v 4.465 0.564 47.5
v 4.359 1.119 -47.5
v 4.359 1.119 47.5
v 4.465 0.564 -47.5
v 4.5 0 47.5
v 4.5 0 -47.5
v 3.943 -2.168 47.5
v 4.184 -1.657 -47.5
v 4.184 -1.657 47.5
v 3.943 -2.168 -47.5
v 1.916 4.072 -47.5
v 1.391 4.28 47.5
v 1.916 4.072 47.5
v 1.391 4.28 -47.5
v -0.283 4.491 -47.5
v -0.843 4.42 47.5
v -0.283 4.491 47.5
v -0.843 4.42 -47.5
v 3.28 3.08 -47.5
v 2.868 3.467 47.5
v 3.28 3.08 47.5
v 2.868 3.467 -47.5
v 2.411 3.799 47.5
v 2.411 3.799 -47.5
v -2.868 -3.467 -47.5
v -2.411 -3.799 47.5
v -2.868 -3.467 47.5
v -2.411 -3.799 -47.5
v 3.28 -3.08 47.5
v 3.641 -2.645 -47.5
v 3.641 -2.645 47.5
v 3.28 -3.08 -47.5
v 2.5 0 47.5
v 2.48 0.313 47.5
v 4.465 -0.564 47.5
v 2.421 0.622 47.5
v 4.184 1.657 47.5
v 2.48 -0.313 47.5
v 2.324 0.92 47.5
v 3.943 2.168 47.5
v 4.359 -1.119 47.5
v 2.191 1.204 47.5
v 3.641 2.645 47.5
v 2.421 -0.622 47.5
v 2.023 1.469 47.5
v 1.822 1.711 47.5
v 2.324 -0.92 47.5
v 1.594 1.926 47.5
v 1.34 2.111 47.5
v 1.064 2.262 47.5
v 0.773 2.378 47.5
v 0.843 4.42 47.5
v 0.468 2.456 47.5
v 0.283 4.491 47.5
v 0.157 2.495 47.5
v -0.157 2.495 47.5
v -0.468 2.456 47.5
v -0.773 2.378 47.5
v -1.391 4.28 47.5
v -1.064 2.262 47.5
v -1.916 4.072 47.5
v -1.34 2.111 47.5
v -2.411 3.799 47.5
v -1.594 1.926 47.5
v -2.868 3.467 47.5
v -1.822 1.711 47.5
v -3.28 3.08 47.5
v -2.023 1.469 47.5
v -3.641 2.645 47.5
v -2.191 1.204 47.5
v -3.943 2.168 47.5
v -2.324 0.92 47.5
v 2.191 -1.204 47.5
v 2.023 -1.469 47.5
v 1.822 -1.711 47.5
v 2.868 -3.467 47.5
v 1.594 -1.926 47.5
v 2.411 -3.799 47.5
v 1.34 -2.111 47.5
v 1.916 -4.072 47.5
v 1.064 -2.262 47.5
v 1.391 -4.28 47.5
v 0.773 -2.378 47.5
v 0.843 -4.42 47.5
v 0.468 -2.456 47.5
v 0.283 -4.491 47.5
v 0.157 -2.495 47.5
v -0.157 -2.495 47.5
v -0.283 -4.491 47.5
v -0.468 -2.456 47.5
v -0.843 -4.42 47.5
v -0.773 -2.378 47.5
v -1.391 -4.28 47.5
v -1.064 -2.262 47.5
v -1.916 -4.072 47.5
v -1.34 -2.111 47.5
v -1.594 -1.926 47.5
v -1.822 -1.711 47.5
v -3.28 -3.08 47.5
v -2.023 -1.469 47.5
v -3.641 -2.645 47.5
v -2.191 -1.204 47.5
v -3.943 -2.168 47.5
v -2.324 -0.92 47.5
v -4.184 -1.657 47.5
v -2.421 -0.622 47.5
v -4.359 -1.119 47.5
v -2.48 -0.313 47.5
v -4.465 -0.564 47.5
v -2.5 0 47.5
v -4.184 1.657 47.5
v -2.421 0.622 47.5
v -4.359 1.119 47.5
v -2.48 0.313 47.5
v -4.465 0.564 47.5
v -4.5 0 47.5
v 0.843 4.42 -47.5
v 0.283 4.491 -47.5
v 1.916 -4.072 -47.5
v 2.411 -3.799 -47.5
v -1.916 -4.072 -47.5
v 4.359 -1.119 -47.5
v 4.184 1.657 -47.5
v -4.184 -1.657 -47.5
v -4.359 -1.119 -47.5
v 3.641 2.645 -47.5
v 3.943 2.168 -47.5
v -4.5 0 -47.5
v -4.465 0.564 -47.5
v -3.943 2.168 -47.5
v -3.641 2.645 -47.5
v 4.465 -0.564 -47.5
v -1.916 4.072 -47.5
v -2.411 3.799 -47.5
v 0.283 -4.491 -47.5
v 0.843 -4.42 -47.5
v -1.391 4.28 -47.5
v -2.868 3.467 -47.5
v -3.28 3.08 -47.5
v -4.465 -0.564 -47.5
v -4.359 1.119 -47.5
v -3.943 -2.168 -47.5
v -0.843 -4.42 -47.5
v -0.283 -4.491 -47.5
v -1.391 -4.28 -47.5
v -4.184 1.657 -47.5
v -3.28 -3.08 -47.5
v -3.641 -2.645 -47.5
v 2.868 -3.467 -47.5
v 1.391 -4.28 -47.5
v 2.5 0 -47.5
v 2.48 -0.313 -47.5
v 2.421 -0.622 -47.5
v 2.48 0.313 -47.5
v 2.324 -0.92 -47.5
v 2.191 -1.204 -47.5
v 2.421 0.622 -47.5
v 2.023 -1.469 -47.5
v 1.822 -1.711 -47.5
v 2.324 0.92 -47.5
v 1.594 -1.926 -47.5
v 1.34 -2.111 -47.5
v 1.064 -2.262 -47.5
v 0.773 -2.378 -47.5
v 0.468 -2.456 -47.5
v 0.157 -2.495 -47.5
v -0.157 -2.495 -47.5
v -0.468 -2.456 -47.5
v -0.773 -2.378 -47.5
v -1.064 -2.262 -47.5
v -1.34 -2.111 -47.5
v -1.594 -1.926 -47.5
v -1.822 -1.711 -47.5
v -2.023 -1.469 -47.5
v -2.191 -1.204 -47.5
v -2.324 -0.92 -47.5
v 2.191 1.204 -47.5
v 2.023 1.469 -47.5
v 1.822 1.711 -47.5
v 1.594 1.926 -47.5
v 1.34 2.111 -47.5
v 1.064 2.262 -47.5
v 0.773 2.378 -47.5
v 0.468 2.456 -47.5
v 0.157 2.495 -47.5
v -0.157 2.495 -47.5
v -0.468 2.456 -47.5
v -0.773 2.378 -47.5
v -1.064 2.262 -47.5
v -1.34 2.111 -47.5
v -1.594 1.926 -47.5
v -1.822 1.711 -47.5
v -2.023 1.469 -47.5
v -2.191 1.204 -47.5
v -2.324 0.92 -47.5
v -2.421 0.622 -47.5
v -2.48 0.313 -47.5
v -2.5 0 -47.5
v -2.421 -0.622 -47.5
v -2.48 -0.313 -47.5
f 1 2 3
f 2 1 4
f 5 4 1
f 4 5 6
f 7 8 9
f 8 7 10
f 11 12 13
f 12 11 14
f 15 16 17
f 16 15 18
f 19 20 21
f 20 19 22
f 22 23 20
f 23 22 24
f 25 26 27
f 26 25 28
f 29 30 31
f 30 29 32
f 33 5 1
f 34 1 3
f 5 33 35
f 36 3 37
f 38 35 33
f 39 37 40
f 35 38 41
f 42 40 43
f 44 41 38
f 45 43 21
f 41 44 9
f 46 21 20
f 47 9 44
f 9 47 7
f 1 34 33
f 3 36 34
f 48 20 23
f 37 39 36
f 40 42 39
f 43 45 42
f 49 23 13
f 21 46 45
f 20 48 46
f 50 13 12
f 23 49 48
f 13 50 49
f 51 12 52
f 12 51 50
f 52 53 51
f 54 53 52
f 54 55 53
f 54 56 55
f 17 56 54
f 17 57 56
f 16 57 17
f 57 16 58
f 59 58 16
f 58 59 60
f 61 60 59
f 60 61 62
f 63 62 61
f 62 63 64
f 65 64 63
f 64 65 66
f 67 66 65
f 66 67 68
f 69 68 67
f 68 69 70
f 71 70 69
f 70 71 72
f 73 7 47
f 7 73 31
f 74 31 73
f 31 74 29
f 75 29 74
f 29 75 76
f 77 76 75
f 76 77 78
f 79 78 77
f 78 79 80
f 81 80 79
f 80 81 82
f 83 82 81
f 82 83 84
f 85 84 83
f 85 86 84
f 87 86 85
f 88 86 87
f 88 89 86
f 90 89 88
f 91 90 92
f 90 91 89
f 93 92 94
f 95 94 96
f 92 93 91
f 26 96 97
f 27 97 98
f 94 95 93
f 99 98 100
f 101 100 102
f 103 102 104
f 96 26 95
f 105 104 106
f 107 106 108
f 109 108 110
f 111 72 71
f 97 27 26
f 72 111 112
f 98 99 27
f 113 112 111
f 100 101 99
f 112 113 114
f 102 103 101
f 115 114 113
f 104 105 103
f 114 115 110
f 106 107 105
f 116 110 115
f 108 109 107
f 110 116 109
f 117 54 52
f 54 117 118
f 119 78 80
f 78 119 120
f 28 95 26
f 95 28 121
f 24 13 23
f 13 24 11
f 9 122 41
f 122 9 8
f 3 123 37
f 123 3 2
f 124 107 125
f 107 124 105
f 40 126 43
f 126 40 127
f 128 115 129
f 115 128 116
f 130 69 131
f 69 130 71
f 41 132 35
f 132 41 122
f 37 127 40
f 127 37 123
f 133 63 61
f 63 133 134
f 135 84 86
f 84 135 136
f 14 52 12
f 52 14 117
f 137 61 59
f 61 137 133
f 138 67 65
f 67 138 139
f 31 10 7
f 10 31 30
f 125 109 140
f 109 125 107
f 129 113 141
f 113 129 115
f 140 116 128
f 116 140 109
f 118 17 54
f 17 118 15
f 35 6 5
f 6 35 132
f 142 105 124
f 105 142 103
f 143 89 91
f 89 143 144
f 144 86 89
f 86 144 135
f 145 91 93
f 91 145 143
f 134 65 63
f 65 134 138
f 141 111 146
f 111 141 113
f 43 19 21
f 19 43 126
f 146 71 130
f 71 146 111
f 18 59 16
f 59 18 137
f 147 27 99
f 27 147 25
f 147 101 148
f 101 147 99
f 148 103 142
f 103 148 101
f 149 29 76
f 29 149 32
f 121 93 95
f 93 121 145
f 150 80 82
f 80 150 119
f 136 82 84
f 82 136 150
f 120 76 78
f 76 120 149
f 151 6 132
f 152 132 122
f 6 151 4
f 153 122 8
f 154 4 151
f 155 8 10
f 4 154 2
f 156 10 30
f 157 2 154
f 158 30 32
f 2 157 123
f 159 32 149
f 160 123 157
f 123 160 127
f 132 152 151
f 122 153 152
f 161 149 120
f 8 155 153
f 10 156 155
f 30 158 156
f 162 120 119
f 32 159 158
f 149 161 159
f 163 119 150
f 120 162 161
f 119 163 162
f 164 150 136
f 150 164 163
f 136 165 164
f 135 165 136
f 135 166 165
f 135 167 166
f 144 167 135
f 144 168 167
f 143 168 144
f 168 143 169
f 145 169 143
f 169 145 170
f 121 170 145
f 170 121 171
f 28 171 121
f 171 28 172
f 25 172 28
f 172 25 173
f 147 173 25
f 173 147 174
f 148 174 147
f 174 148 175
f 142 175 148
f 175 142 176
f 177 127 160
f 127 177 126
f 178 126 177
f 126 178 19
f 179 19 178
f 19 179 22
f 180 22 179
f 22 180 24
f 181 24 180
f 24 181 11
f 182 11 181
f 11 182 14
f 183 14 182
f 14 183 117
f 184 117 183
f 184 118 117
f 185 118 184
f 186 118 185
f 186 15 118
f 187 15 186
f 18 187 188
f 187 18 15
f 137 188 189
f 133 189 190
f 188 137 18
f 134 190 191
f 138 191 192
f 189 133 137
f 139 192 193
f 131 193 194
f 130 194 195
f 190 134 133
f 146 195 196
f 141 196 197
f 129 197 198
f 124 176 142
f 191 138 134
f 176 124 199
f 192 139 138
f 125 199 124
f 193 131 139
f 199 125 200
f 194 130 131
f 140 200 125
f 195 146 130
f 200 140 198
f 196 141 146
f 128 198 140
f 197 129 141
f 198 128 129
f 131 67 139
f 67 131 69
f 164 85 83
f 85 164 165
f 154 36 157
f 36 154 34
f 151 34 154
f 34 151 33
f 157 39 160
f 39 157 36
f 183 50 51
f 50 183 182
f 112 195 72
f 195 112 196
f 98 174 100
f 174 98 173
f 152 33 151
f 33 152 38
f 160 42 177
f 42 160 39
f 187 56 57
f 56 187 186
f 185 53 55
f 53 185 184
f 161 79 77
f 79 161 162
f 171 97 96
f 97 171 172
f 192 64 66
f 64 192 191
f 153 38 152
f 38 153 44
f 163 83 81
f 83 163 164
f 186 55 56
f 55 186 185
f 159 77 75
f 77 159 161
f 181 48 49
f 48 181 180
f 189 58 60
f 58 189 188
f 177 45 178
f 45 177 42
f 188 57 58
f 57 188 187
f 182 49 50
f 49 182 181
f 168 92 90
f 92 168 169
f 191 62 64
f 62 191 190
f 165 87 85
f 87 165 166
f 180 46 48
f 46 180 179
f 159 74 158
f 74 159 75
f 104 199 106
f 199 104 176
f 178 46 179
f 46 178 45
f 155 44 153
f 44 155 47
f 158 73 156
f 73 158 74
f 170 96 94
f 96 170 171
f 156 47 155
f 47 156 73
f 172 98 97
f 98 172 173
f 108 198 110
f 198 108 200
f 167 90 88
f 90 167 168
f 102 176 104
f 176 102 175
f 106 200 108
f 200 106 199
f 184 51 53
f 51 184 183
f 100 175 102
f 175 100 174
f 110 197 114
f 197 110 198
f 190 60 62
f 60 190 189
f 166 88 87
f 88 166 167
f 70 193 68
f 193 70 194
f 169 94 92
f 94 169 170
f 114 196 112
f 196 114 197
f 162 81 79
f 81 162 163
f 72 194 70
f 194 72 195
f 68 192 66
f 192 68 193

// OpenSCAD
$fn = 50;


difference() {
	union() {
		translate(v = [0, 0, -47.5000000000]) {
			cylinder(h = 95, r = 4.5000000000);
		}
	}
	union() {
		translate(v = [0, 0, -100.0000000000]) {
			cylinder(h = 200, r = 2.5000000000);
		}
	}
}
